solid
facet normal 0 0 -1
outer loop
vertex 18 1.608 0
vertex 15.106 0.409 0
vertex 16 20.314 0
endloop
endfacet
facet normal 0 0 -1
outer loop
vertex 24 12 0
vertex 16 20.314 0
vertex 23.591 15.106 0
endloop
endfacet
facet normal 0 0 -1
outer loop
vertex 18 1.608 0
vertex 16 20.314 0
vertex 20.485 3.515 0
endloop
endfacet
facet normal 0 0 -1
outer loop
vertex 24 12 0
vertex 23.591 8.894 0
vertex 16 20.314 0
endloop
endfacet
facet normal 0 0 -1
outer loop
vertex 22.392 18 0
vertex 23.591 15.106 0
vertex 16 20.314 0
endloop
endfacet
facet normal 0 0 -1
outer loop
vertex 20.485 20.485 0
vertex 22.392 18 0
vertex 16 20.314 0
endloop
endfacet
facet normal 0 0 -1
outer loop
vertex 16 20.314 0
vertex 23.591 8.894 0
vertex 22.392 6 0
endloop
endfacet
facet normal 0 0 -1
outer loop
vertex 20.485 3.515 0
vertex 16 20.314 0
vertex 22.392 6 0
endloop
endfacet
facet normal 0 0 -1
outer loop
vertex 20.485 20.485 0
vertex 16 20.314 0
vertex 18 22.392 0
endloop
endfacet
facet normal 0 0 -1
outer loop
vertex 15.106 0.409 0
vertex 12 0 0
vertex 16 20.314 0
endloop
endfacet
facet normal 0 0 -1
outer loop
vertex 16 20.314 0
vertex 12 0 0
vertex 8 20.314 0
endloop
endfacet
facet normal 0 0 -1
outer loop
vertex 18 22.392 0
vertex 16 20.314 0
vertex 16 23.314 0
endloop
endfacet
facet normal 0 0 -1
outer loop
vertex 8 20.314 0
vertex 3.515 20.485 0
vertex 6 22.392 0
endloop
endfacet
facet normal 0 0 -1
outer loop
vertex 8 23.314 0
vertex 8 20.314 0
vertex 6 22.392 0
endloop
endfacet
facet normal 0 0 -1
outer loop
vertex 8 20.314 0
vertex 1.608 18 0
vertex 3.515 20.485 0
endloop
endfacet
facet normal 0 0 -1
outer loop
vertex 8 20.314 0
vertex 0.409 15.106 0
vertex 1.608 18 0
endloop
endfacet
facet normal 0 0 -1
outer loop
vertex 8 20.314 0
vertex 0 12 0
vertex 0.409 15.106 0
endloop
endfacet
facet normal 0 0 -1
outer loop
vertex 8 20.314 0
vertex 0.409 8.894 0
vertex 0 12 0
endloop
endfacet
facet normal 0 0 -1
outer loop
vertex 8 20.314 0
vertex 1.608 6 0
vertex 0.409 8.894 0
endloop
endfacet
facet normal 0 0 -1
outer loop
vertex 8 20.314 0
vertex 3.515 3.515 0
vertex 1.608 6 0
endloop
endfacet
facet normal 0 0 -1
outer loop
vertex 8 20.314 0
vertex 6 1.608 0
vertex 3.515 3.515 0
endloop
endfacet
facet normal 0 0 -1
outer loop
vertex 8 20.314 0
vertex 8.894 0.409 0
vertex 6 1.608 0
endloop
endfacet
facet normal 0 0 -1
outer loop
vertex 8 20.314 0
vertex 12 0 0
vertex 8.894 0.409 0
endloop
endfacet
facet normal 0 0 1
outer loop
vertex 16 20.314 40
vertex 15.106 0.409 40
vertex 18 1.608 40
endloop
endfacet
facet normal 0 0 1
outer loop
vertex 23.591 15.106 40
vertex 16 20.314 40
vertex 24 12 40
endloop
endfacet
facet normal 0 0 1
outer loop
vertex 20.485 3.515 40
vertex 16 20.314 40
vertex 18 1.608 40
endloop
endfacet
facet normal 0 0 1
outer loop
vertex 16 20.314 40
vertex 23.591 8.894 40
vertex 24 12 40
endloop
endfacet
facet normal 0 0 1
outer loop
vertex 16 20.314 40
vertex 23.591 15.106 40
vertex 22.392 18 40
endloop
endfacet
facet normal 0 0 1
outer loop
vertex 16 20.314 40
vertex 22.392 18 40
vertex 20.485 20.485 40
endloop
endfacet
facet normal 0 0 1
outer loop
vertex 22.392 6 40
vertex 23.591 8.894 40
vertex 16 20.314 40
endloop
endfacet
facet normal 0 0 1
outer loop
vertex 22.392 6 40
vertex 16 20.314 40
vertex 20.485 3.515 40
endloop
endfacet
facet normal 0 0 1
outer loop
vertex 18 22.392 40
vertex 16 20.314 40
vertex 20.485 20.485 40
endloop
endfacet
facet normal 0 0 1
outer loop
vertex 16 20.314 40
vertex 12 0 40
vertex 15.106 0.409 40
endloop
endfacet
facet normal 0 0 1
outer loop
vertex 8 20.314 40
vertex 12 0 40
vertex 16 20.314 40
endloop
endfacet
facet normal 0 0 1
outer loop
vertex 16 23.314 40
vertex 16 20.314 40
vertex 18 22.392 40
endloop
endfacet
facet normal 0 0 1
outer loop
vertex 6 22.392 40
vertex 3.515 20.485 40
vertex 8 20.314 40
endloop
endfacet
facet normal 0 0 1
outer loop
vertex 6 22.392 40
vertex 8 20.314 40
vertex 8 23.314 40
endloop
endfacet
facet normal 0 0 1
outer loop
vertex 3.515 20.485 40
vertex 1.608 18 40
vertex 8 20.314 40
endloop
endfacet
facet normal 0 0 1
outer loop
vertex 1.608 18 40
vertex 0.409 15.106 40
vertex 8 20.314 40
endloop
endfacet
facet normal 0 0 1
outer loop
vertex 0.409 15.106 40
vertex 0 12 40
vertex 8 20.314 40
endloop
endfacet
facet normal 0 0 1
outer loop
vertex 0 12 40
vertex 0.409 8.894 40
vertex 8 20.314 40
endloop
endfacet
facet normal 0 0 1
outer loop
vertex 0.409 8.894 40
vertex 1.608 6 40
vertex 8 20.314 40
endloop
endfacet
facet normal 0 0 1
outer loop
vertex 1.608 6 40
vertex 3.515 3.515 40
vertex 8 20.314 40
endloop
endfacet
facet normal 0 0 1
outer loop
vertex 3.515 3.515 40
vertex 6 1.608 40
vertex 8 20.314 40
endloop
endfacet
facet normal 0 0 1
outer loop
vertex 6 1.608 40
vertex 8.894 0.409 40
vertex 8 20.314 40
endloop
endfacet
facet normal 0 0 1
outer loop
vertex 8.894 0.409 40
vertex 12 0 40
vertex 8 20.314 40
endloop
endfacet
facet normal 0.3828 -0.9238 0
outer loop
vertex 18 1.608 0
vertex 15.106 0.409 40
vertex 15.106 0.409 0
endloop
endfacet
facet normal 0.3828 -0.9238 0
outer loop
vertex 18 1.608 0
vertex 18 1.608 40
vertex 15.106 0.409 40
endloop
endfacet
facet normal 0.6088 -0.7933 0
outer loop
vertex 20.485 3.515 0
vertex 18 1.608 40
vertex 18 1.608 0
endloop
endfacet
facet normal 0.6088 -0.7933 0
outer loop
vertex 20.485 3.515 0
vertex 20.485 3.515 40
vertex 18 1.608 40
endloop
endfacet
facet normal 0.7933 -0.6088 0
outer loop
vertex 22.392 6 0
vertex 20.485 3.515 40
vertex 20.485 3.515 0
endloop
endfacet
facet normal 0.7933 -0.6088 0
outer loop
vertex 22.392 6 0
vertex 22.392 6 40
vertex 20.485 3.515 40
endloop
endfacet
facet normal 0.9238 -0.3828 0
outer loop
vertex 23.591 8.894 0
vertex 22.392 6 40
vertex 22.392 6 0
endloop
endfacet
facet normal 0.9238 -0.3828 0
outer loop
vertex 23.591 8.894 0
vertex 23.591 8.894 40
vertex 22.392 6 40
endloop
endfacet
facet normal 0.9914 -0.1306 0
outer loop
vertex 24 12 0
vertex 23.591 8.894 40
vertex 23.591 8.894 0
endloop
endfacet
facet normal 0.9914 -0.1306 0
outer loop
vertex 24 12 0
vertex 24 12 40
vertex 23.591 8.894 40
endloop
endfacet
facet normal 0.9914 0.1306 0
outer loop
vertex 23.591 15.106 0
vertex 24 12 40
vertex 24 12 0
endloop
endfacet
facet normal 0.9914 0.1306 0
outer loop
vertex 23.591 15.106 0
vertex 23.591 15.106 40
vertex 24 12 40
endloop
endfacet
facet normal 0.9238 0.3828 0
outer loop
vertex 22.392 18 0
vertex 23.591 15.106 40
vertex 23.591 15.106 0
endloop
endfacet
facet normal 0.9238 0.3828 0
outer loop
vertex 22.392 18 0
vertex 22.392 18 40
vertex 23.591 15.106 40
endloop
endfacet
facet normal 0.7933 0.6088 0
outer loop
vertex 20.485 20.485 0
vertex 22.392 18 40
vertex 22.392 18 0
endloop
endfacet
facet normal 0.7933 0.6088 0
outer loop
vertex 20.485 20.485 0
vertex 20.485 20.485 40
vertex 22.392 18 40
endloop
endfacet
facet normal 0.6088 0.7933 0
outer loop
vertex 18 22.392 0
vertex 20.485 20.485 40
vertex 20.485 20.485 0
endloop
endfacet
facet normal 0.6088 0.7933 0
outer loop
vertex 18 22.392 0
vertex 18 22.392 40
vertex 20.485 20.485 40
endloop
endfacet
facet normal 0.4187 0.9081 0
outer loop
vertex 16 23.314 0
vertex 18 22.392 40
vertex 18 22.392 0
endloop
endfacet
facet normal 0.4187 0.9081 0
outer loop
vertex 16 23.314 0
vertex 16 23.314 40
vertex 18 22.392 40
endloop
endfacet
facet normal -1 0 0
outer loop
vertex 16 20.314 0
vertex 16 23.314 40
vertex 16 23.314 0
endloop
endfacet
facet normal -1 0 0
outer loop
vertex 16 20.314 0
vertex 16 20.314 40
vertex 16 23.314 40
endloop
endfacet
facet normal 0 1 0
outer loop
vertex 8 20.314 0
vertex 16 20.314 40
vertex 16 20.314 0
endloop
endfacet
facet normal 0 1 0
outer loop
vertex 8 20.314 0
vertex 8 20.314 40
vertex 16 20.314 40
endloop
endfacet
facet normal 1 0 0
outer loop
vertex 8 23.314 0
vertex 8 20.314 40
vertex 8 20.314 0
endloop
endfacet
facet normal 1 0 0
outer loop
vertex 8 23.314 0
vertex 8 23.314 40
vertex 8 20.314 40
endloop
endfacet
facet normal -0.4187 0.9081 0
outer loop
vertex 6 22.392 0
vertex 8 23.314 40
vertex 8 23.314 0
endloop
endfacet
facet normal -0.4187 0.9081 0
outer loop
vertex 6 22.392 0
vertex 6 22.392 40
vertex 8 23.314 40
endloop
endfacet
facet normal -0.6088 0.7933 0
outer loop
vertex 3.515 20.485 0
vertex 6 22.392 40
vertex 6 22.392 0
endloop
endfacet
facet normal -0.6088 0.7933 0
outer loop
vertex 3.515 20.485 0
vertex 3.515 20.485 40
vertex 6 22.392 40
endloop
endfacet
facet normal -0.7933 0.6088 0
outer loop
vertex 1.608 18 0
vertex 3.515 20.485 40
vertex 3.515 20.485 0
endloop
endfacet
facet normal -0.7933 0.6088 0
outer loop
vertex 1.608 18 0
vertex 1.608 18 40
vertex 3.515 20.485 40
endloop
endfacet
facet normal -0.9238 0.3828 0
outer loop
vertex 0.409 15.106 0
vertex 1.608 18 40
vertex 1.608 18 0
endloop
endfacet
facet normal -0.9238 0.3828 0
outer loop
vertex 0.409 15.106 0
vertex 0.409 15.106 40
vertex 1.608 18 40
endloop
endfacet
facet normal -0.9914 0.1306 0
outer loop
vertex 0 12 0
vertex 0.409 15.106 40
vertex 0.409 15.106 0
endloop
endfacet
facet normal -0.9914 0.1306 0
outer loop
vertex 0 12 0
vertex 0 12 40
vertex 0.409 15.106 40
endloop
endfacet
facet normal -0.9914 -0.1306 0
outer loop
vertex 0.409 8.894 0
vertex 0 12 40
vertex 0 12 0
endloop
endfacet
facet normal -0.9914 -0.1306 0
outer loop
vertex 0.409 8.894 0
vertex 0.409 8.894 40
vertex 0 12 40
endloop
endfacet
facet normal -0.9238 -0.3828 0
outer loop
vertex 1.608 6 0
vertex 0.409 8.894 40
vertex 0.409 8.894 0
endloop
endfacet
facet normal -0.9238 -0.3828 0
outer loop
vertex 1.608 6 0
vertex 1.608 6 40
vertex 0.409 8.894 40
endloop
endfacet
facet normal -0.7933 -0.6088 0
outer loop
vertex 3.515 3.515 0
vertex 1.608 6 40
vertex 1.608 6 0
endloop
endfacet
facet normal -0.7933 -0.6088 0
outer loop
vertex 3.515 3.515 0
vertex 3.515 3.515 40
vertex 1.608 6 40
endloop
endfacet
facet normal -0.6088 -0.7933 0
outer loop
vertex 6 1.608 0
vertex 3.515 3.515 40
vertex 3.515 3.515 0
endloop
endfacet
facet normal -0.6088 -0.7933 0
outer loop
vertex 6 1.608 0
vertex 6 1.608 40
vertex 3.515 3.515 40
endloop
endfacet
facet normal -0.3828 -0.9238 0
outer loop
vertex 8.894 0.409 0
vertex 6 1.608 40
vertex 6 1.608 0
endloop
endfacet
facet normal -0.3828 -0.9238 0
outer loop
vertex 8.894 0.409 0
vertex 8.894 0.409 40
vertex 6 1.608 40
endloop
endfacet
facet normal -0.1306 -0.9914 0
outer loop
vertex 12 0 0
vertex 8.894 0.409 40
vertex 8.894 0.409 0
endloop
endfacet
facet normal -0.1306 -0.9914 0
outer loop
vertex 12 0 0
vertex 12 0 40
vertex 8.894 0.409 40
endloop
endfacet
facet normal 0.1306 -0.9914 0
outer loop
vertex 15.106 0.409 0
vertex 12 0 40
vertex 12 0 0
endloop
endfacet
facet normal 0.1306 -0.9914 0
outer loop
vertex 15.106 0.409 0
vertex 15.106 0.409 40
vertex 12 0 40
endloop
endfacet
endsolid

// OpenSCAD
$fn = 32;

// ----------------------------------------------------------------------
// Keyway shaft: d24 shaft, key 8 x 3 mm
// ----------------------------------------------------------------------

// --- parameters (mm) ---
shaft_r = 12;             // shaft radius
key_w = 8;                // keyway width
key_d = 3;                // keyway depth below the surface line
plate_t = 40;             // shaft length, Z (extrusion height)

shaft_d = 2 * shaft_r;  // shaft diameter
circle_step = 15;  // polygon sampling step, degrees

profile = [[6, 22.392], [3.515, 20.485], [1.608, 18], [0.409, 15.106], [0, 12], [0.409, 8.894], [1.608, 6], [3.515, 3.515], [6, 1.608], [8.894, 0.409], [12, 0], [15.106, 0.409], [18, 1.608], [20.485, 3.515], [22.392, 6], [23.591, 8.894], [24, 12], [23.591, 15.106], [22.392, 18], [20.485, 20.485], [18, 22.392], [16, 23.314], [16, 20.314], [8, 20.314], [8, 23.314]];  // primary outline, 25 points, counter clockwise

// --- the one profile operation ---
linear_extrude(height = plate_t) polygon(points = profile);
